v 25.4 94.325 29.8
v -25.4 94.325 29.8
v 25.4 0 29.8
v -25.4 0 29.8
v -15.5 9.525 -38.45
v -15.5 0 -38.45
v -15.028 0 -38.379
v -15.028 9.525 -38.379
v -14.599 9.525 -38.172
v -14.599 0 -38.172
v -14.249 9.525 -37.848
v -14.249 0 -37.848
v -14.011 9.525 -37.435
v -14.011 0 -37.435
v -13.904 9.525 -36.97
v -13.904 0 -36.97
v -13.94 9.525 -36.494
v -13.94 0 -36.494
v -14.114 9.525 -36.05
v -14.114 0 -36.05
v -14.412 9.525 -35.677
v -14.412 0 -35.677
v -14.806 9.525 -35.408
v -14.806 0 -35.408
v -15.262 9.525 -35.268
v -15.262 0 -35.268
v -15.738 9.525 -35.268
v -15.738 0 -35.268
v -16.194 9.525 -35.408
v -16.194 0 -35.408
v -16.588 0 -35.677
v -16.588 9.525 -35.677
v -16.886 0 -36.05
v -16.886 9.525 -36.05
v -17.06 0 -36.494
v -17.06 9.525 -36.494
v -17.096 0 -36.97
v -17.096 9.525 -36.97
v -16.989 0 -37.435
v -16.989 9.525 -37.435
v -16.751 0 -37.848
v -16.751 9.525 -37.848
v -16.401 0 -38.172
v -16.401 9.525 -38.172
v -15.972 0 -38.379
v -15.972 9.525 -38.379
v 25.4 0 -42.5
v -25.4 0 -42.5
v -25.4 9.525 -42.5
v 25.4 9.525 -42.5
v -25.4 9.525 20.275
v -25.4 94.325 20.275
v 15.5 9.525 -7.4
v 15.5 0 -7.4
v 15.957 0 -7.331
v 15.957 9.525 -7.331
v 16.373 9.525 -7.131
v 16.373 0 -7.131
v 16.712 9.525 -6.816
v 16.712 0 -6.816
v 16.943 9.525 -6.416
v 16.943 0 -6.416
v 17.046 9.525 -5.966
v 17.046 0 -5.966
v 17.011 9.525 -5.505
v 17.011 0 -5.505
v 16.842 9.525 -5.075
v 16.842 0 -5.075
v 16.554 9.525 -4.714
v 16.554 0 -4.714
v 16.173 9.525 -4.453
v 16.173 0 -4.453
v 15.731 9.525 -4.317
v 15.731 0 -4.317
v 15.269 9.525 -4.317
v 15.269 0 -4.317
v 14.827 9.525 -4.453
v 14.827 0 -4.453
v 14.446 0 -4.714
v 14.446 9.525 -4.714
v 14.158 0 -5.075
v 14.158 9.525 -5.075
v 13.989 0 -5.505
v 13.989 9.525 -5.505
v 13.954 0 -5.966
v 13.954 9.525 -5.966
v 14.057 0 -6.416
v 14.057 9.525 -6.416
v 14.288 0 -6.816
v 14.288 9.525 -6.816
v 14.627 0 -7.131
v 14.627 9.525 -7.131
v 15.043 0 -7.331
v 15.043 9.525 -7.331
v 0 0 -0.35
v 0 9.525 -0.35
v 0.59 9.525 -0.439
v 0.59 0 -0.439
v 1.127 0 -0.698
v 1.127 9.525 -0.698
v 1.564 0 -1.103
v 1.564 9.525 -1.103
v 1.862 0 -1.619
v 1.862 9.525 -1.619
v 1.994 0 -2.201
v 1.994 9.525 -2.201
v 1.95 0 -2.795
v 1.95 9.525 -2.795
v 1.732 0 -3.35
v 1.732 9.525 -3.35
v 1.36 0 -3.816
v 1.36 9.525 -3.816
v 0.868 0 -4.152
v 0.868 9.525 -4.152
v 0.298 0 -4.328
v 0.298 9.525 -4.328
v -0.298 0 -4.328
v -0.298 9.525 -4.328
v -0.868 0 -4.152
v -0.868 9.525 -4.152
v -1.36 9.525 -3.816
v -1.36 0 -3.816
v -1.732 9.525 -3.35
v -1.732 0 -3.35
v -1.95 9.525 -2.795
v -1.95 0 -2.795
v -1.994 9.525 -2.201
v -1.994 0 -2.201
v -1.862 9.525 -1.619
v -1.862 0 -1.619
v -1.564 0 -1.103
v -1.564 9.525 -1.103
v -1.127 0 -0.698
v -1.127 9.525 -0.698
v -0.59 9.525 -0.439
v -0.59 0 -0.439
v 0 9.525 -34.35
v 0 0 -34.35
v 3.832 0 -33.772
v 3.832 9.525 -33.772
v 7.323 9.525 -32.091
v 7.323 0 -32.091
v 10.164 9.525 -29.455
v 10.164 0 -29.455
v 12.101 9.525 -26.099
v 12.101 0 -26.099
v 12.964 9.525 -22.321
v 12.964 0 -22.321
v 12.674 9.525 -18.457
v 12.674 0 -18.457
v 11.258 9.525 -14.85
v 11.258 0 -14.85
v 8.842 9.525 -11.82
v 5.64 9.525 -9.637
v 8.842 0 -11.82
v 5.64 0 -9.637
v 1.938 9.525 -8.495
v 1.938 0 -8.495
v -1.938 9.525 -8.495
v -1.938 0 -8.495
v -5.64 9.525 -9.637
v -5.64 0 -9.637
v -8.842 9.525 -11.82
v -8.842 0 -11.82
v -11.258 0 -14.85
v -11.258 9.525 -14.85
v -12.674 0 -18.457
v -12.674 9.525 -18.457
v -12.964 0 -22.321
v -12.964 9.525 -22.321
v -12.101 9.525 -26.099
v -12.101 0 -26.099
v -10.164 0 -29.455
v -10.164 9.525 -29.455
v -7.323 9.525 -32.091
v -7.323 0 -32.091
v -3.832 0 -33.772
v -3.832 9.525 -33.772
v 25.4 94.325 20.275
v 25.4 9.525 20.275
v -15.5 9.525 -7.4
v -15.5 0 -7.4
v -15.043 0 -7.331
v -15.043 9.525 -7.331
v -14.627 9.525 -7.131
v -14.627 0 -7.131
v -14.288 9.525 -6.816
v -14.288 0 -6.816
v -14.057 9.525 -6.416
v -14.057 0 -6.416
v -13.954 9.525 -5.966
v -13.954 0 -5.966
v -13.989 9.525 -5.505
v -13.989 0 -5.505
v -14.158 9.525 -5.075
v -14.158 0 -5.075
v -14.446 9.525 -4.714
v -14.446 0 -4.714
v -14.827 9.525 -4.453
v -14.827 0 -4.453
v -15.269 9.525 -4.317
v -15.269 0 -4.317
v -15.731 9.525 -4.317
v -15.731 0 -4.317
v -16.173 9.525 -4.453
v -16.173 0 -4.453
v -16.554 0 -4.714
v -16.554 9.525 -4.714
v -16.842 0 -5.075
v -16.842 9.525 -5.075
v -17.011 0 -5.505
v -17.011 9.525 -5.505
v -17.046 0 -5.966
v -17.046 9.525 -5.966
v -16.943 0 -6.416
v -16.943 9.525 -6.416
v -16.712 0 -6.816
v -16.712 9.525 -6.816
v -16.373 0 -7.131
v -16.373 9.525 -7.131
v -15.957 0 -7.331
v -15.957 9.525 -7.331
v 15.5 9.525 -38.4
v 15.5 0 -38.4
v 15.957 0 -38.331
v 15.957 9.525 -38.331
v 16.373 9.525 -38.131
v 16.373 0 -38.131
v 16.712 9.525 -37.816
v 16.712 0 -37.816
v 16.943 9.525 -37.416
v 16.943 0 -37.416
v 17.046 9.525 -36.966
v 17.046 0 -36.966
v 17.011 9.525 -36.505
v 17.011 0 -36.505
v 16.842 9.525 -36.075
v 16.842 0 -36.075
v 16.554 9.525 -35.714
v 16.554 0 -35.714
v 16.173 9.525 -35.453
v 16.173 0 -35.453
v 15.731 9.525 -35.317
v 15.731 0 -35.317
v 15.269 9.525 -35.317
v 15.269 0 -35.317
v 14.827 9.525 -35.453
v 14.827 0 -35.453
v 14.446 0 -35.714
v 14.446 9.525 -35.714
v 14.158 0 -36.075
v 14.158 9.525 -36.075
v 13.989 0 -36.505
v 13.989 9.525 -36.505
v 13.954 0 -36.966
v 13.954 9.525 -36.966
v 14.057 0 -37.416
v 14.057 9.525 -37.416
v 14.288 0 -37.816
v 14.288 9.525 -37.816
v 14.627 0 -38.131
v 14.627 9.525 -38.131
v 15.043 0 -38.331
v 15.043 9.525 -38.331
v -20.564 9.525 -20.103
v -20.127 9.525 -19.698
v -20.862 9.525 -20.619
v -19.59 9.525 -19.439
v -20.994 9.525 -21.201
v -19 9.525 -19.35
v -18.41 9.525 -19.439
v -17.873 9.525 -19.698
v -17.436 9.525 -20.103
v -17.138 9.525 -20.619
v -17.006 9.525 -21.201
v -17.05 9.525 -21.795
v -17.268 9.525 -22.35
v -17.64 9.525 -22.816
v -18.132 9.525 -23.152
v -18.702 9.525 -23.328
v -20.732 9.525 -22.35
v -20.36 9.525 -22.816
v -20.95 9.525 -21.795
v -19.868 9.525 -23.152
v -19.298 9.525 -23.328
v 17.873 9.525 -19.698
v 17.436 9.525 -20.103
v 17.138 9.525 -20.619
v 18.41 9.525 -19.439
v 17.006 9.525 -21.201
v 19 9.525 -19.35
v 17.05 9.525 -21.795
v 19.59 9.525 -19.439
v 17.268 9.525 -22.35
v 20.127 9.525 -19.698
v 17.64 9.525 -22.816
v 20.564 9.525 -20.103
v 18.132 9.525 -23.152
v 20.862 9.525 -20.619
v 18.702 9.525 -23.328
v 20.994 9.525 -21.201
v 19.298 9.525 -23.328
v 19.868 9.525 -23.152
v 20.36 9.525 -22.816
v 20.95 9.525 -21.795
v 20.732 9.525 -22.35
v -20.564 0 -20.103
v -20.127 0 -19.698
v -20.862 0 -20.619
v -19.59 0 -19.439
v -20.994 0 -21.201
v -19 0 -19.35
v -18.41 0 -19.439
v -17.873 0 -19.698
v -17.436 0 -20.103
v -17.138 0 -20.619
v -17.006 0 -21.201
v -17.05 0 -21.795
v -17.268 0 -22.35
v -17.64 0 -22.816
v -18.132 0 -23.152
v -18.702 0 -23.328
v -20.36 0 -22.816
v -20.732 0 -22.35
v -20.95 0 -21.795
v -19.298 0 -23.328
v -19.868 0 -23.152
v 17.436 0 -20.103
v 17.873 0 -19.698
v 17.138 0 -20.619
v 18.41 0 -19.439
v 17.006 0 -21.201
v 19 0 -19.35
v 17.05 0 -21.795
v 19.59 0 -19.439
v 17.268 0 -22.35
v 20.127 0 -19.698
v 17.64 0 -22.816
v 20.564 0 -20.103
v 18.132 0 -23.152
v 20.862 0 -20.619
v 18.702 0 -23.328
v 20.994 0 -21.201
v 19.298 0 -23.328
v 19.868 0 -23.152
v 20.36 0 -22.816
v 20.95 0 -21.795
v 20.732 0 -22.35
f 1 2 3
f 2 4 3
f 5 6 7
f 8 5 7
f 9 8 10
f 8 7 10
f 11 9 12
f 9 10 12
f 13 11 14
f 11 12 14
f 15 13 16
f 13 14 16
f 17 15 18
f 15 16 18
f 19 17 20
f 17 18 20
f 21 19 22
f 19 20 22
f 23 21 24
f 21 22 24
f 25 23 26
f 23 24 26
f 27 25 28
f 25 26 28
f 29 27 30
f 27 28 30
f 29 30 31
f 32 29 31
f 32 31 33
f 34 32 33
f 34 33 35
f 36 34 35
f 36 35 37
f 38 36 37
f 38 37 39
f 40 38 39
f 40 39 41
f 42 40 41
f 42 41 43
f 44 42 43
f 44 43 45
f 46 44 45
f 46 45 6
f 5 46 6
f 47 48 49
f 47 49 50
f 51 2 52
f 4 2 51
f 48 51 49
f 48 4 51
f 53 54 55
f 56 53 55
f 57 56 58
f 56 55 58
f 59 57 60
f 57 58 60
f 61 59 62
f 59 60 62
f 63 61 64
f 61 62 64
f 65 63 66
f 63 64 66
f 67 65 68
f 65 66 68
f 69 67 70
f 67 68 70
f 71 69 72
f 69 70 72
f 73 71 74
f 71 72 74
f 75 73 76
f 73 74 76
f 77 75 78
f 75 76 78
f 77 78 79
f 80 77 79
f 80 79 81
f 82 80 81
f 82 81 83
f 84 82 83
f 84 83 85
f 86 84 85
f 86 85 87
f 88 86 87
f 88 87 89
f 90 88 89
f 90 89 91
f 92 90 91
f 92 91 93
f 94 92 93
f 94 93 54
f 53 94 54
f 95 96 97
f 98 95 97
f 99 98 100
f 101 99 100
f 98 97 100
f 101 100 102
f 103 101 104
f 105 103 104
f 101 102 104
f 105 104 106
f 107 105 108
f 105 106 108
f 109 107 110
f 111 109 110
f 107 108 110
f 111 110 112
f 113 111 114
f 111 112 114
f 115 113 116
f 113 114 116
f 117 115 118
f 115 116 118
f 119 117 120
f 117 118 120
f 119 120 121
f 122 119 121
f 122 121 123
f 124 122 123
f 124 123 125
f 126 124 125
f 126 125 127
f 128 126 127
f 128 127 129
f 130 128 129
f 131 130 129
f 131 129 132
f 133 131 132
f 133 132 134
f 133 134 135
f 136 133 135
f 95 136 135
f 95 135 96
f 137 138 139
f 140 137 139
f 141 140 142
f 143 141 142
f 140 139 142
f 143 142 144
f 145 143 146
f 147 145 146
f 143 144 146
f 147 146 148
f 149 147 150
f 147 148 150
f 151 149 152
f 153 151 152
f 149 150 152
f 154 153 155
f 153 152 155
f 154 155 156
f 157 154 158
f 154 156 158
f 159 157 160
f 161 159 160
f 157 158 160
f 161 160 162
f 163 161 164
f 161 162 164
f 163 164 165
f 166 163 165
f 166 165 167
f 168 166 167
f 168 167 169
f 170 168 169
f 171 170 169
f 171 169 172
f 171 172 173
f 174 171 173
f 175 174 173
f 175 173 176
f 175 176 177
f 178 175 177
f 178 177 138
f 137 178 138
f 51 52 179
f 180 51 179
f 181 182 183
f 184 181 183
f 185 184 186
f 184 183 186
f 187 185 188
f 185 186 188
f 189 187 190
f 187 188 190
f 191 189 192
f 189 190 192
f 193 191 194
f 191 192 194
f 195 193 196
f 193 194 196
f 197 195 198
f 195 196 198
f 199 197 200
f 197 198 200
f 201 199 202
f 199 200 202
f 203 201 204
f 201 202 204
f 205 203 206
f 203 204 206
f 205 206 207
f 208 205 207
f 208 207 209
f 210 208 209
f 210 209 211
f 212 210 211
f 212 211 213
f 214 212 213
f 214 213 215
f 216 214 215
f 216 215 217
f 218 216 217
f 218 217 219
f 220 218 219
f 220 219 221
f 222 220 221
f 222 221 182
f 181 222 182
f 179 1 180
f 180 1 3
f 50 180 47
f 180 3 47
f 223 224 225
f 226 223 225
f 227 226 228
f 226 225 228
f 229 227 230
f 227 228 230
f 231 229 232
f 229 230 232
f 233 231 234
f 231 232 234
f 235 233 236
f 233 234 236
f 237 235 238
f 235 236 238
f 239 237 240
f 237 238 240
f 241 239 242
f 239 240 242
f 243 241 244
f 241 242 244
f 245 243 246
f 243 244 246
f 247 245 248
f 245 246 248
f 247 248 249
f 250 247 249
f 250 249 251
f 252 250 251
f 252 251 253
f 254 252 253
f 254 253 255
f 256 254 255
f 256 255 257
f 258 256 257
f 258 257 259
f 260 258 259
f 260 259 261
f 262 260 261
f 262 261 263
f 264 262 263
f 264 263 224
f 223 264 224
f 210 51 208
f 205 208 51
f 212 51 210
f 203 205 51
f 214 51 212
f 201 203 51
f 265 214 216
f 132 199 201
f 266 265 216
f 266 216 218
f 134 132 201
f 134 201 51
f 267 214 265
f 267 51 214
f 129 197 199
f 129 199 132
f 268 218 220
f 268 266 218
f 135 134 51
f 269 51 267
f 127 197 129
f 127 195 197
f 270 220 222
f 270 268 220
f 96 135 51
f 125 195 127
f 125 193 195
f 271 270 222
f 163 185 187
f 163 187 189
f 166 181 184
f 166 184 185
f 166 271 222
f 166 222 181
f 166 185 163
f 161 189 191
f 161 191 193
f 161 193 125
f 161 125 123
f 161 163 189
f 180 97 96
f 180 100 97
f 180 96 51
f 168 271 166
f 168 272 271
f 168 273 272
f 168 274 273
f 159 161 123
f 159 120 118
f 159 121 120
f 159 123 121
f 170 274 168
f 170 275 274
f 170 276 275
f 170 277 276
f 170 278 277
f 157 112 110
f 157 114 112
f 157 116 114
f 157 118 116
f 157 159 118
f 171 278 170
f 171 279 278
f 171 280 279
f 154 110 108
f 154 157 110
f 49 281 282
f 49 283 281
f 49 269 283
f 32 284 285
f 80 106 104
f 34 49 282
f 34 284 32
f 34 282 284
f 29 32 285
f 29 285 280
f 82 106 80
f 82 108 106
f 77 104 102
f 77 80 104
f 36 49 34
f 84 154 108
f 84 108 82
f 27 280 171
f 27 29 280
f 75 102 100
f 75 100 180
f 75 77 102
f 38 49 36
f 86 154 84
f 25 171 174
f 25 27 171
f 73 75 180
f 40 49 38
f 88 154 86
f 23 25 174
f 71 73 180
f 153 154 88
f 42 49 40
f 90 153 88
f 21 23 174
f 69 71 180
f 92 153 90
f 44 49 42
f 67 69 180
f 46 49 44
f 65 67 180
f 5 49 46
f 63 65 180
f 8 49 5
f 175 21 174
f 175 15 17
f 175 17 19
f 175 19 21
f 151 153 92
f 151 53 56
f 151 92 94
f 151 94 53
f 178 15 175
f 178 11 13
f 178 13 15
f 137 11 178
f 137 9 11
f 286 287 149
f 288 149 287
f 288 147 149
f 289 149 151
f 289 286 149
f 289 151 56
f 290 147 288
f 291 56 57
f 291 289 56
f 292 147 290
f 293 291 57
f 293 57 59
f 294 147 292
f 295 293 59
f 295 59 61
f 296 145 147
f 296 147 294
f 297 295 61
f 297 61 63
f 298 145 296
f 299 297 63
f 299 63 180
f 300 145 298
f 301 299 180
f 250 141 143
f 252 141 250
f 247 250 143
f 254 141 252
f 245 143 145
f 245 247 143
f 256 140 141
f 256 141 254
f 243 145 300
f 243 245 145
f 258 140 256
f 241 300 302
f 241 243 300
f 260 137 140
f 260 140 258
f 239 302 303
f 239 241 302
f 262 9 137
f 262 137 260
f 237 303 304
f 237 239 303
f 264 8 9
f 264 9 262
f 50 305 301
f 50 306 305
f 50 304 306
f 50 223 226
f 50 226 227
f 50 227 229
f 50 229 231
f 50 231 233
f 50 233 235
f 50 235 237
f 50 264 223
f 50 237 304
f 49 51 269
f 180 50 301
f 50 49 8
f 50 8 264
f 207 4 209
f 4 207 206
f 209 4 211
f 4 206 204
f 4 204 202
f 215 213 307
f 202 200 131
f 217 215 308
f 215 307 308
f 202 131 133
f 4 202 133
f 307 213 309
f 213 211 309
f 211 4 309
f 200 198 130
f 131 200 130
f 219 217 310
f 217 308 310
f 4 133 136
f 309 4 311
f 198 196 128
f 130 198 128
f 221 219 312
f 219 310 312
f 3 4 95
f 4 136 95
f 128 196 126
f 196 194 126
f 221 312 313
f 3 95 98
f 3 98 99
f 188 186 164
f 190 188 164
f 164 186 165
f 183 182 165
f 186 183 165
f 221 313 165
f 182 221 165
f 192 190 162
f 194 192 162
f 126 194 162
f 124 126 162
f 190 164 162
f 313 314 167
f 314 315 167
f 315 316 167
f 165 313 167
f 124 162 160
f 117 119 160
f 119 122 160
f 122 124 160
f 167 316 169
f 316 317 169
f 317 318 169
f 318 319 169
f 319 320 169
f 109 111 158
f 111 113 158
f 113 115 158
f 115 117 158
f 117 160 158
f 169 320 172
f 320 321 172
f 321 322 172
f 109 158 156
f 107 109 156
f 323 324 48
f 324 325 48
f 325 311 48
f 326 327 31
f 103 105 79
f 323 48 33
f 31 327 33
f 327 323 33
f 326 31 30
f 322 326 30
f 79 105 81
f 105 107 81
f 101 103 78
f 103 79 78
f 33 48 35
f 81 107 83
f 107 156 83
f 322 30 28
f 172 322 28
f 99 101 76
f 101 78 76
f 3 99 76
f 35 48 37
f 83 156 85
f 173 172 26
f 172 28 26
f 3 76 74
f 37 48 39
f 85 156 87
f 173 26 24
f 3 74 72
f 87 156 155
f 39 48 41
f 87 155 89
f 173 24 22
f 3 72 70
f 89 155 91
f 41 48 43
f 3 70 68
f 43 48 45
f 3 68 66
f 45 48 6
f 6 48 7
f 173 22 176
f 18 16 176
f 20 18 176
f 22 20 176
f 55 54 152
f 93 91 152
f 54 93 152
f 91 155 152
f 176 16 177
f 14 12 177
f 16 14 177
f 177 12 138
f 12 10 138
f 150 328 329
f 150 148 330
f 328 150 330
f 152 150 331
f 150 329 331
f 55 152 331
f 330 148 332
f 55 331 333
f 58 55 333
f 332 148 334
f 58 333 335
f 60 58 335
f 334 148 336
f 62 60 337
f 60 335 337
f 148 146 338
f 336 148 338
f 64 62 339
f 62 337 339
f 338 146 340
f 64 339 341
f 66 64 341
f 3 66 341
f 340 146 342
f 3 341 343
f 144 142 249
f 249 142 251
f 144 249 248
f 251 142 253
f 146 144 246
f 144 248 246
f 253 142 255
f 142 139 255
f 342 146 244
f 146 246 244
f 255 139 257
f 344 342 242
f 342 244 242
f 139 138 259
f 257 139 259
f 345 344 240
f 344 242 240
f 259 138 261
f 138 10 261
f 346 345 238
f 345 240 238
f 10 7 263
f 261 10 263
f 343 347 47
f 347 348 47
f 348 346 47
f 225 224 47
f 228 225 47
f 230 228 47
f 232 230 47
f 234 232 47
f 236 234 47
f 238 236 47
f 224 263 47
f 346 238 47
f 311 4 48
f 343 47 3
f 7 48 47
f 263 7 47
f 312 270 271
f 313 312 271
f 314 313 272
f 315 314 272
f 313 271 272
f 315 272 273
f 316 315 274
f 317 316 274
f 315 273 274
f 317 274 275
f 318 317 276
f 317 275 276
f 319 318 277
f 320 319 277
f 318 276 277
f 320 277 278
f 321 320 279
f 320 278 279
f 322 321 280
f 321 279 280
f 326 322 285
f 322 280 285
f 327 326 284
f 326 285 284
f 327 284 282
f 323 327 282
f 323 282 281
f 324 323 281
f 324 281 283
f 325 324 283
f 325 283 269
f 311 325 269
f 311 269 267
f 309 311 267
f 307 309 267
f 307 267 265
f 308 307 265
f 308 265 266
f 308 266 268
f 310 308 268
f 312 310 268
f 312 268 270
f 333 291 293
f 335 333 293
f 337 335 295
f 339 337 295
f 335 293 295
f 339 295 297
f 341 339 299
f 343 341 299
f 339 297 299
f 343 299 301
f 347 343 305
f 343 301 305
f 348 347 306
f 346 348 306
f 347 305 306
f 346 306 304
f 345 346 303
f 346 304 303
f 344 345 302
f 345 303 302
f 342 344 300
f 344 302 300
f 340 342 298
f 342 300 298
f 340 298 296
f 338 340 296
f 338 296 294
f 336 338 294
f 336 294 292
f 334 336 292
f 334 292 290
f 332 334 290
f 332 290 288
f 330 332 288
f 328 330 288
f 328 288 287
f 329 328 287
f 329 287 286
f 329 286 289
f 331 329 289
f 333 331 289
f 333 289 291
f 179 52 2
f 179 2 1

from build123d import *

# Parameters (mm, degrees)
CROQUIS1_W              = 50.8
CROQUIS1_H              = 85
SALIENTE_EXTRUIR1_DEPTH = 9.525
CROQUIS2_R              = 13
CORTAR_EXTRUIR1_DEPTH   = 51.419595645
CROQUIS3_R              = 1.55
CROQUIS3_R_2            = 1.6
CORTAR_EXTRUIR2_DEPTH   = 51.419595645
CROQUIS4_R              = 2
CORTAR_EXTRUIR3_DEPTH   = 51.419595645
CROQUIS5_W              = 50.8
CROQUIS5_H              = 12.7
CORTAR_EXTRUIR4_DEPTH   = 51.419595645
CROQUIS6_W              = 50.8
CROQUIS6_H              = 9.525
SALIENTE_EXTRUIR2_DEPTH = 84.8


with BuildPart() as part:
    # Croquis1 → Saliente-Extruir1 (new body)
    with BuildSketch(Plane(origin=(0, 0, 0), x_dir=(1, 0, 0), z_dir=(0, 1, 0))):
        Rectangle(CROQUIS1_W, CROQUIS1_H)
    extrude(amount=SALIENTE_EXTRUIR1_DEPTH)

    # Croquis2 → Cortar-Extruir1 (cut, through all)
    with BuildSketch(Plane.XZ):
        with Locations(Location((0, -21.35, 0), (0, 0, 270))):
            Circle(CROQUIS2_R)
    extrude(amount=-CORTAR_EXTRUIR1_DEPTH, mode=Mode.SUBTRACT)

    # Croquis3 → Cortar-Extruir2 (cut, through all)
    with BuildSketch(Plane.XZ):
        with Locations(Location((-15.5, -5.85, 0), (0, 0, 270))):
            Circle(CROQUIS3_R)
        with Locations(Location((15.5, -5.85, 0), (0, 0, 270))):
            Circle(CROQUIS3_R)
        with Locations(Location((15.5, -36.85, 0), (0, 0, 270))):
            Circle(CROQUIS3_R)
        with Locations(Location((-15.5, -36.85, 0), (0, 0, 270))):
            Circle(CROQUIS3_R_2)
    extrude(amount=-CORTAR_EXTRUIR2_DEPTH, mode=Mode.SUBTRACT)

    # Croquis4 → Cortar-Extruir3 (cut, through all)
    with BuildSketch(Plane(origin=(0, 9.525, 0), x_dir=(1, 0, 0), z_dir=(0, 1, 0))):
        with Locations(Location((-19, 21.35, 0), (0, 0, 270))):
            Circle(CROQUIS4_R)
        with Locations(Location((19, 21.35, 0), (0, 0, 270))):
            Circle(CROQUIS4_R)
        with Locations(Location((0, 2.35, 0), (0, 0, 270))):
            Circle(CROQUIS4_R)
    extrude(amount=-CORTAR_EXTRUIR3_DEPTH, mode=Mode.SUBTRACT)

    # Croquis5 → Cortar-Extruir4 (cut, through all)
    with BuildSketch(Plane(origin=(0, 9.525, 0), x_dir=(1, 0, 0), z_dir=(0, 1, 0))):
        with Locations((0, -36.15)):
            Rectangle(CROQUIS5_W, CROQUIS5_H)
    extrude(amount=-CORTAR_EXTRUIR4_DEPTH, mode=Mode.SUBTRACT)

    # Croquis6 → Saliente-Extruir2 (add)
    with BuildSketch(Plane(origin=(0, 9.525, 0), x_dir=(1, 0, 0), z_dir=(0, 1, 0))):
        with Locations((0, -25.0375)):
            Rectangle(CROQUIS6_W, CROQUIS6_H)
    extrude(amount=SALIENTE_EXTRUIR2_DEPTH)


solid = part.part
